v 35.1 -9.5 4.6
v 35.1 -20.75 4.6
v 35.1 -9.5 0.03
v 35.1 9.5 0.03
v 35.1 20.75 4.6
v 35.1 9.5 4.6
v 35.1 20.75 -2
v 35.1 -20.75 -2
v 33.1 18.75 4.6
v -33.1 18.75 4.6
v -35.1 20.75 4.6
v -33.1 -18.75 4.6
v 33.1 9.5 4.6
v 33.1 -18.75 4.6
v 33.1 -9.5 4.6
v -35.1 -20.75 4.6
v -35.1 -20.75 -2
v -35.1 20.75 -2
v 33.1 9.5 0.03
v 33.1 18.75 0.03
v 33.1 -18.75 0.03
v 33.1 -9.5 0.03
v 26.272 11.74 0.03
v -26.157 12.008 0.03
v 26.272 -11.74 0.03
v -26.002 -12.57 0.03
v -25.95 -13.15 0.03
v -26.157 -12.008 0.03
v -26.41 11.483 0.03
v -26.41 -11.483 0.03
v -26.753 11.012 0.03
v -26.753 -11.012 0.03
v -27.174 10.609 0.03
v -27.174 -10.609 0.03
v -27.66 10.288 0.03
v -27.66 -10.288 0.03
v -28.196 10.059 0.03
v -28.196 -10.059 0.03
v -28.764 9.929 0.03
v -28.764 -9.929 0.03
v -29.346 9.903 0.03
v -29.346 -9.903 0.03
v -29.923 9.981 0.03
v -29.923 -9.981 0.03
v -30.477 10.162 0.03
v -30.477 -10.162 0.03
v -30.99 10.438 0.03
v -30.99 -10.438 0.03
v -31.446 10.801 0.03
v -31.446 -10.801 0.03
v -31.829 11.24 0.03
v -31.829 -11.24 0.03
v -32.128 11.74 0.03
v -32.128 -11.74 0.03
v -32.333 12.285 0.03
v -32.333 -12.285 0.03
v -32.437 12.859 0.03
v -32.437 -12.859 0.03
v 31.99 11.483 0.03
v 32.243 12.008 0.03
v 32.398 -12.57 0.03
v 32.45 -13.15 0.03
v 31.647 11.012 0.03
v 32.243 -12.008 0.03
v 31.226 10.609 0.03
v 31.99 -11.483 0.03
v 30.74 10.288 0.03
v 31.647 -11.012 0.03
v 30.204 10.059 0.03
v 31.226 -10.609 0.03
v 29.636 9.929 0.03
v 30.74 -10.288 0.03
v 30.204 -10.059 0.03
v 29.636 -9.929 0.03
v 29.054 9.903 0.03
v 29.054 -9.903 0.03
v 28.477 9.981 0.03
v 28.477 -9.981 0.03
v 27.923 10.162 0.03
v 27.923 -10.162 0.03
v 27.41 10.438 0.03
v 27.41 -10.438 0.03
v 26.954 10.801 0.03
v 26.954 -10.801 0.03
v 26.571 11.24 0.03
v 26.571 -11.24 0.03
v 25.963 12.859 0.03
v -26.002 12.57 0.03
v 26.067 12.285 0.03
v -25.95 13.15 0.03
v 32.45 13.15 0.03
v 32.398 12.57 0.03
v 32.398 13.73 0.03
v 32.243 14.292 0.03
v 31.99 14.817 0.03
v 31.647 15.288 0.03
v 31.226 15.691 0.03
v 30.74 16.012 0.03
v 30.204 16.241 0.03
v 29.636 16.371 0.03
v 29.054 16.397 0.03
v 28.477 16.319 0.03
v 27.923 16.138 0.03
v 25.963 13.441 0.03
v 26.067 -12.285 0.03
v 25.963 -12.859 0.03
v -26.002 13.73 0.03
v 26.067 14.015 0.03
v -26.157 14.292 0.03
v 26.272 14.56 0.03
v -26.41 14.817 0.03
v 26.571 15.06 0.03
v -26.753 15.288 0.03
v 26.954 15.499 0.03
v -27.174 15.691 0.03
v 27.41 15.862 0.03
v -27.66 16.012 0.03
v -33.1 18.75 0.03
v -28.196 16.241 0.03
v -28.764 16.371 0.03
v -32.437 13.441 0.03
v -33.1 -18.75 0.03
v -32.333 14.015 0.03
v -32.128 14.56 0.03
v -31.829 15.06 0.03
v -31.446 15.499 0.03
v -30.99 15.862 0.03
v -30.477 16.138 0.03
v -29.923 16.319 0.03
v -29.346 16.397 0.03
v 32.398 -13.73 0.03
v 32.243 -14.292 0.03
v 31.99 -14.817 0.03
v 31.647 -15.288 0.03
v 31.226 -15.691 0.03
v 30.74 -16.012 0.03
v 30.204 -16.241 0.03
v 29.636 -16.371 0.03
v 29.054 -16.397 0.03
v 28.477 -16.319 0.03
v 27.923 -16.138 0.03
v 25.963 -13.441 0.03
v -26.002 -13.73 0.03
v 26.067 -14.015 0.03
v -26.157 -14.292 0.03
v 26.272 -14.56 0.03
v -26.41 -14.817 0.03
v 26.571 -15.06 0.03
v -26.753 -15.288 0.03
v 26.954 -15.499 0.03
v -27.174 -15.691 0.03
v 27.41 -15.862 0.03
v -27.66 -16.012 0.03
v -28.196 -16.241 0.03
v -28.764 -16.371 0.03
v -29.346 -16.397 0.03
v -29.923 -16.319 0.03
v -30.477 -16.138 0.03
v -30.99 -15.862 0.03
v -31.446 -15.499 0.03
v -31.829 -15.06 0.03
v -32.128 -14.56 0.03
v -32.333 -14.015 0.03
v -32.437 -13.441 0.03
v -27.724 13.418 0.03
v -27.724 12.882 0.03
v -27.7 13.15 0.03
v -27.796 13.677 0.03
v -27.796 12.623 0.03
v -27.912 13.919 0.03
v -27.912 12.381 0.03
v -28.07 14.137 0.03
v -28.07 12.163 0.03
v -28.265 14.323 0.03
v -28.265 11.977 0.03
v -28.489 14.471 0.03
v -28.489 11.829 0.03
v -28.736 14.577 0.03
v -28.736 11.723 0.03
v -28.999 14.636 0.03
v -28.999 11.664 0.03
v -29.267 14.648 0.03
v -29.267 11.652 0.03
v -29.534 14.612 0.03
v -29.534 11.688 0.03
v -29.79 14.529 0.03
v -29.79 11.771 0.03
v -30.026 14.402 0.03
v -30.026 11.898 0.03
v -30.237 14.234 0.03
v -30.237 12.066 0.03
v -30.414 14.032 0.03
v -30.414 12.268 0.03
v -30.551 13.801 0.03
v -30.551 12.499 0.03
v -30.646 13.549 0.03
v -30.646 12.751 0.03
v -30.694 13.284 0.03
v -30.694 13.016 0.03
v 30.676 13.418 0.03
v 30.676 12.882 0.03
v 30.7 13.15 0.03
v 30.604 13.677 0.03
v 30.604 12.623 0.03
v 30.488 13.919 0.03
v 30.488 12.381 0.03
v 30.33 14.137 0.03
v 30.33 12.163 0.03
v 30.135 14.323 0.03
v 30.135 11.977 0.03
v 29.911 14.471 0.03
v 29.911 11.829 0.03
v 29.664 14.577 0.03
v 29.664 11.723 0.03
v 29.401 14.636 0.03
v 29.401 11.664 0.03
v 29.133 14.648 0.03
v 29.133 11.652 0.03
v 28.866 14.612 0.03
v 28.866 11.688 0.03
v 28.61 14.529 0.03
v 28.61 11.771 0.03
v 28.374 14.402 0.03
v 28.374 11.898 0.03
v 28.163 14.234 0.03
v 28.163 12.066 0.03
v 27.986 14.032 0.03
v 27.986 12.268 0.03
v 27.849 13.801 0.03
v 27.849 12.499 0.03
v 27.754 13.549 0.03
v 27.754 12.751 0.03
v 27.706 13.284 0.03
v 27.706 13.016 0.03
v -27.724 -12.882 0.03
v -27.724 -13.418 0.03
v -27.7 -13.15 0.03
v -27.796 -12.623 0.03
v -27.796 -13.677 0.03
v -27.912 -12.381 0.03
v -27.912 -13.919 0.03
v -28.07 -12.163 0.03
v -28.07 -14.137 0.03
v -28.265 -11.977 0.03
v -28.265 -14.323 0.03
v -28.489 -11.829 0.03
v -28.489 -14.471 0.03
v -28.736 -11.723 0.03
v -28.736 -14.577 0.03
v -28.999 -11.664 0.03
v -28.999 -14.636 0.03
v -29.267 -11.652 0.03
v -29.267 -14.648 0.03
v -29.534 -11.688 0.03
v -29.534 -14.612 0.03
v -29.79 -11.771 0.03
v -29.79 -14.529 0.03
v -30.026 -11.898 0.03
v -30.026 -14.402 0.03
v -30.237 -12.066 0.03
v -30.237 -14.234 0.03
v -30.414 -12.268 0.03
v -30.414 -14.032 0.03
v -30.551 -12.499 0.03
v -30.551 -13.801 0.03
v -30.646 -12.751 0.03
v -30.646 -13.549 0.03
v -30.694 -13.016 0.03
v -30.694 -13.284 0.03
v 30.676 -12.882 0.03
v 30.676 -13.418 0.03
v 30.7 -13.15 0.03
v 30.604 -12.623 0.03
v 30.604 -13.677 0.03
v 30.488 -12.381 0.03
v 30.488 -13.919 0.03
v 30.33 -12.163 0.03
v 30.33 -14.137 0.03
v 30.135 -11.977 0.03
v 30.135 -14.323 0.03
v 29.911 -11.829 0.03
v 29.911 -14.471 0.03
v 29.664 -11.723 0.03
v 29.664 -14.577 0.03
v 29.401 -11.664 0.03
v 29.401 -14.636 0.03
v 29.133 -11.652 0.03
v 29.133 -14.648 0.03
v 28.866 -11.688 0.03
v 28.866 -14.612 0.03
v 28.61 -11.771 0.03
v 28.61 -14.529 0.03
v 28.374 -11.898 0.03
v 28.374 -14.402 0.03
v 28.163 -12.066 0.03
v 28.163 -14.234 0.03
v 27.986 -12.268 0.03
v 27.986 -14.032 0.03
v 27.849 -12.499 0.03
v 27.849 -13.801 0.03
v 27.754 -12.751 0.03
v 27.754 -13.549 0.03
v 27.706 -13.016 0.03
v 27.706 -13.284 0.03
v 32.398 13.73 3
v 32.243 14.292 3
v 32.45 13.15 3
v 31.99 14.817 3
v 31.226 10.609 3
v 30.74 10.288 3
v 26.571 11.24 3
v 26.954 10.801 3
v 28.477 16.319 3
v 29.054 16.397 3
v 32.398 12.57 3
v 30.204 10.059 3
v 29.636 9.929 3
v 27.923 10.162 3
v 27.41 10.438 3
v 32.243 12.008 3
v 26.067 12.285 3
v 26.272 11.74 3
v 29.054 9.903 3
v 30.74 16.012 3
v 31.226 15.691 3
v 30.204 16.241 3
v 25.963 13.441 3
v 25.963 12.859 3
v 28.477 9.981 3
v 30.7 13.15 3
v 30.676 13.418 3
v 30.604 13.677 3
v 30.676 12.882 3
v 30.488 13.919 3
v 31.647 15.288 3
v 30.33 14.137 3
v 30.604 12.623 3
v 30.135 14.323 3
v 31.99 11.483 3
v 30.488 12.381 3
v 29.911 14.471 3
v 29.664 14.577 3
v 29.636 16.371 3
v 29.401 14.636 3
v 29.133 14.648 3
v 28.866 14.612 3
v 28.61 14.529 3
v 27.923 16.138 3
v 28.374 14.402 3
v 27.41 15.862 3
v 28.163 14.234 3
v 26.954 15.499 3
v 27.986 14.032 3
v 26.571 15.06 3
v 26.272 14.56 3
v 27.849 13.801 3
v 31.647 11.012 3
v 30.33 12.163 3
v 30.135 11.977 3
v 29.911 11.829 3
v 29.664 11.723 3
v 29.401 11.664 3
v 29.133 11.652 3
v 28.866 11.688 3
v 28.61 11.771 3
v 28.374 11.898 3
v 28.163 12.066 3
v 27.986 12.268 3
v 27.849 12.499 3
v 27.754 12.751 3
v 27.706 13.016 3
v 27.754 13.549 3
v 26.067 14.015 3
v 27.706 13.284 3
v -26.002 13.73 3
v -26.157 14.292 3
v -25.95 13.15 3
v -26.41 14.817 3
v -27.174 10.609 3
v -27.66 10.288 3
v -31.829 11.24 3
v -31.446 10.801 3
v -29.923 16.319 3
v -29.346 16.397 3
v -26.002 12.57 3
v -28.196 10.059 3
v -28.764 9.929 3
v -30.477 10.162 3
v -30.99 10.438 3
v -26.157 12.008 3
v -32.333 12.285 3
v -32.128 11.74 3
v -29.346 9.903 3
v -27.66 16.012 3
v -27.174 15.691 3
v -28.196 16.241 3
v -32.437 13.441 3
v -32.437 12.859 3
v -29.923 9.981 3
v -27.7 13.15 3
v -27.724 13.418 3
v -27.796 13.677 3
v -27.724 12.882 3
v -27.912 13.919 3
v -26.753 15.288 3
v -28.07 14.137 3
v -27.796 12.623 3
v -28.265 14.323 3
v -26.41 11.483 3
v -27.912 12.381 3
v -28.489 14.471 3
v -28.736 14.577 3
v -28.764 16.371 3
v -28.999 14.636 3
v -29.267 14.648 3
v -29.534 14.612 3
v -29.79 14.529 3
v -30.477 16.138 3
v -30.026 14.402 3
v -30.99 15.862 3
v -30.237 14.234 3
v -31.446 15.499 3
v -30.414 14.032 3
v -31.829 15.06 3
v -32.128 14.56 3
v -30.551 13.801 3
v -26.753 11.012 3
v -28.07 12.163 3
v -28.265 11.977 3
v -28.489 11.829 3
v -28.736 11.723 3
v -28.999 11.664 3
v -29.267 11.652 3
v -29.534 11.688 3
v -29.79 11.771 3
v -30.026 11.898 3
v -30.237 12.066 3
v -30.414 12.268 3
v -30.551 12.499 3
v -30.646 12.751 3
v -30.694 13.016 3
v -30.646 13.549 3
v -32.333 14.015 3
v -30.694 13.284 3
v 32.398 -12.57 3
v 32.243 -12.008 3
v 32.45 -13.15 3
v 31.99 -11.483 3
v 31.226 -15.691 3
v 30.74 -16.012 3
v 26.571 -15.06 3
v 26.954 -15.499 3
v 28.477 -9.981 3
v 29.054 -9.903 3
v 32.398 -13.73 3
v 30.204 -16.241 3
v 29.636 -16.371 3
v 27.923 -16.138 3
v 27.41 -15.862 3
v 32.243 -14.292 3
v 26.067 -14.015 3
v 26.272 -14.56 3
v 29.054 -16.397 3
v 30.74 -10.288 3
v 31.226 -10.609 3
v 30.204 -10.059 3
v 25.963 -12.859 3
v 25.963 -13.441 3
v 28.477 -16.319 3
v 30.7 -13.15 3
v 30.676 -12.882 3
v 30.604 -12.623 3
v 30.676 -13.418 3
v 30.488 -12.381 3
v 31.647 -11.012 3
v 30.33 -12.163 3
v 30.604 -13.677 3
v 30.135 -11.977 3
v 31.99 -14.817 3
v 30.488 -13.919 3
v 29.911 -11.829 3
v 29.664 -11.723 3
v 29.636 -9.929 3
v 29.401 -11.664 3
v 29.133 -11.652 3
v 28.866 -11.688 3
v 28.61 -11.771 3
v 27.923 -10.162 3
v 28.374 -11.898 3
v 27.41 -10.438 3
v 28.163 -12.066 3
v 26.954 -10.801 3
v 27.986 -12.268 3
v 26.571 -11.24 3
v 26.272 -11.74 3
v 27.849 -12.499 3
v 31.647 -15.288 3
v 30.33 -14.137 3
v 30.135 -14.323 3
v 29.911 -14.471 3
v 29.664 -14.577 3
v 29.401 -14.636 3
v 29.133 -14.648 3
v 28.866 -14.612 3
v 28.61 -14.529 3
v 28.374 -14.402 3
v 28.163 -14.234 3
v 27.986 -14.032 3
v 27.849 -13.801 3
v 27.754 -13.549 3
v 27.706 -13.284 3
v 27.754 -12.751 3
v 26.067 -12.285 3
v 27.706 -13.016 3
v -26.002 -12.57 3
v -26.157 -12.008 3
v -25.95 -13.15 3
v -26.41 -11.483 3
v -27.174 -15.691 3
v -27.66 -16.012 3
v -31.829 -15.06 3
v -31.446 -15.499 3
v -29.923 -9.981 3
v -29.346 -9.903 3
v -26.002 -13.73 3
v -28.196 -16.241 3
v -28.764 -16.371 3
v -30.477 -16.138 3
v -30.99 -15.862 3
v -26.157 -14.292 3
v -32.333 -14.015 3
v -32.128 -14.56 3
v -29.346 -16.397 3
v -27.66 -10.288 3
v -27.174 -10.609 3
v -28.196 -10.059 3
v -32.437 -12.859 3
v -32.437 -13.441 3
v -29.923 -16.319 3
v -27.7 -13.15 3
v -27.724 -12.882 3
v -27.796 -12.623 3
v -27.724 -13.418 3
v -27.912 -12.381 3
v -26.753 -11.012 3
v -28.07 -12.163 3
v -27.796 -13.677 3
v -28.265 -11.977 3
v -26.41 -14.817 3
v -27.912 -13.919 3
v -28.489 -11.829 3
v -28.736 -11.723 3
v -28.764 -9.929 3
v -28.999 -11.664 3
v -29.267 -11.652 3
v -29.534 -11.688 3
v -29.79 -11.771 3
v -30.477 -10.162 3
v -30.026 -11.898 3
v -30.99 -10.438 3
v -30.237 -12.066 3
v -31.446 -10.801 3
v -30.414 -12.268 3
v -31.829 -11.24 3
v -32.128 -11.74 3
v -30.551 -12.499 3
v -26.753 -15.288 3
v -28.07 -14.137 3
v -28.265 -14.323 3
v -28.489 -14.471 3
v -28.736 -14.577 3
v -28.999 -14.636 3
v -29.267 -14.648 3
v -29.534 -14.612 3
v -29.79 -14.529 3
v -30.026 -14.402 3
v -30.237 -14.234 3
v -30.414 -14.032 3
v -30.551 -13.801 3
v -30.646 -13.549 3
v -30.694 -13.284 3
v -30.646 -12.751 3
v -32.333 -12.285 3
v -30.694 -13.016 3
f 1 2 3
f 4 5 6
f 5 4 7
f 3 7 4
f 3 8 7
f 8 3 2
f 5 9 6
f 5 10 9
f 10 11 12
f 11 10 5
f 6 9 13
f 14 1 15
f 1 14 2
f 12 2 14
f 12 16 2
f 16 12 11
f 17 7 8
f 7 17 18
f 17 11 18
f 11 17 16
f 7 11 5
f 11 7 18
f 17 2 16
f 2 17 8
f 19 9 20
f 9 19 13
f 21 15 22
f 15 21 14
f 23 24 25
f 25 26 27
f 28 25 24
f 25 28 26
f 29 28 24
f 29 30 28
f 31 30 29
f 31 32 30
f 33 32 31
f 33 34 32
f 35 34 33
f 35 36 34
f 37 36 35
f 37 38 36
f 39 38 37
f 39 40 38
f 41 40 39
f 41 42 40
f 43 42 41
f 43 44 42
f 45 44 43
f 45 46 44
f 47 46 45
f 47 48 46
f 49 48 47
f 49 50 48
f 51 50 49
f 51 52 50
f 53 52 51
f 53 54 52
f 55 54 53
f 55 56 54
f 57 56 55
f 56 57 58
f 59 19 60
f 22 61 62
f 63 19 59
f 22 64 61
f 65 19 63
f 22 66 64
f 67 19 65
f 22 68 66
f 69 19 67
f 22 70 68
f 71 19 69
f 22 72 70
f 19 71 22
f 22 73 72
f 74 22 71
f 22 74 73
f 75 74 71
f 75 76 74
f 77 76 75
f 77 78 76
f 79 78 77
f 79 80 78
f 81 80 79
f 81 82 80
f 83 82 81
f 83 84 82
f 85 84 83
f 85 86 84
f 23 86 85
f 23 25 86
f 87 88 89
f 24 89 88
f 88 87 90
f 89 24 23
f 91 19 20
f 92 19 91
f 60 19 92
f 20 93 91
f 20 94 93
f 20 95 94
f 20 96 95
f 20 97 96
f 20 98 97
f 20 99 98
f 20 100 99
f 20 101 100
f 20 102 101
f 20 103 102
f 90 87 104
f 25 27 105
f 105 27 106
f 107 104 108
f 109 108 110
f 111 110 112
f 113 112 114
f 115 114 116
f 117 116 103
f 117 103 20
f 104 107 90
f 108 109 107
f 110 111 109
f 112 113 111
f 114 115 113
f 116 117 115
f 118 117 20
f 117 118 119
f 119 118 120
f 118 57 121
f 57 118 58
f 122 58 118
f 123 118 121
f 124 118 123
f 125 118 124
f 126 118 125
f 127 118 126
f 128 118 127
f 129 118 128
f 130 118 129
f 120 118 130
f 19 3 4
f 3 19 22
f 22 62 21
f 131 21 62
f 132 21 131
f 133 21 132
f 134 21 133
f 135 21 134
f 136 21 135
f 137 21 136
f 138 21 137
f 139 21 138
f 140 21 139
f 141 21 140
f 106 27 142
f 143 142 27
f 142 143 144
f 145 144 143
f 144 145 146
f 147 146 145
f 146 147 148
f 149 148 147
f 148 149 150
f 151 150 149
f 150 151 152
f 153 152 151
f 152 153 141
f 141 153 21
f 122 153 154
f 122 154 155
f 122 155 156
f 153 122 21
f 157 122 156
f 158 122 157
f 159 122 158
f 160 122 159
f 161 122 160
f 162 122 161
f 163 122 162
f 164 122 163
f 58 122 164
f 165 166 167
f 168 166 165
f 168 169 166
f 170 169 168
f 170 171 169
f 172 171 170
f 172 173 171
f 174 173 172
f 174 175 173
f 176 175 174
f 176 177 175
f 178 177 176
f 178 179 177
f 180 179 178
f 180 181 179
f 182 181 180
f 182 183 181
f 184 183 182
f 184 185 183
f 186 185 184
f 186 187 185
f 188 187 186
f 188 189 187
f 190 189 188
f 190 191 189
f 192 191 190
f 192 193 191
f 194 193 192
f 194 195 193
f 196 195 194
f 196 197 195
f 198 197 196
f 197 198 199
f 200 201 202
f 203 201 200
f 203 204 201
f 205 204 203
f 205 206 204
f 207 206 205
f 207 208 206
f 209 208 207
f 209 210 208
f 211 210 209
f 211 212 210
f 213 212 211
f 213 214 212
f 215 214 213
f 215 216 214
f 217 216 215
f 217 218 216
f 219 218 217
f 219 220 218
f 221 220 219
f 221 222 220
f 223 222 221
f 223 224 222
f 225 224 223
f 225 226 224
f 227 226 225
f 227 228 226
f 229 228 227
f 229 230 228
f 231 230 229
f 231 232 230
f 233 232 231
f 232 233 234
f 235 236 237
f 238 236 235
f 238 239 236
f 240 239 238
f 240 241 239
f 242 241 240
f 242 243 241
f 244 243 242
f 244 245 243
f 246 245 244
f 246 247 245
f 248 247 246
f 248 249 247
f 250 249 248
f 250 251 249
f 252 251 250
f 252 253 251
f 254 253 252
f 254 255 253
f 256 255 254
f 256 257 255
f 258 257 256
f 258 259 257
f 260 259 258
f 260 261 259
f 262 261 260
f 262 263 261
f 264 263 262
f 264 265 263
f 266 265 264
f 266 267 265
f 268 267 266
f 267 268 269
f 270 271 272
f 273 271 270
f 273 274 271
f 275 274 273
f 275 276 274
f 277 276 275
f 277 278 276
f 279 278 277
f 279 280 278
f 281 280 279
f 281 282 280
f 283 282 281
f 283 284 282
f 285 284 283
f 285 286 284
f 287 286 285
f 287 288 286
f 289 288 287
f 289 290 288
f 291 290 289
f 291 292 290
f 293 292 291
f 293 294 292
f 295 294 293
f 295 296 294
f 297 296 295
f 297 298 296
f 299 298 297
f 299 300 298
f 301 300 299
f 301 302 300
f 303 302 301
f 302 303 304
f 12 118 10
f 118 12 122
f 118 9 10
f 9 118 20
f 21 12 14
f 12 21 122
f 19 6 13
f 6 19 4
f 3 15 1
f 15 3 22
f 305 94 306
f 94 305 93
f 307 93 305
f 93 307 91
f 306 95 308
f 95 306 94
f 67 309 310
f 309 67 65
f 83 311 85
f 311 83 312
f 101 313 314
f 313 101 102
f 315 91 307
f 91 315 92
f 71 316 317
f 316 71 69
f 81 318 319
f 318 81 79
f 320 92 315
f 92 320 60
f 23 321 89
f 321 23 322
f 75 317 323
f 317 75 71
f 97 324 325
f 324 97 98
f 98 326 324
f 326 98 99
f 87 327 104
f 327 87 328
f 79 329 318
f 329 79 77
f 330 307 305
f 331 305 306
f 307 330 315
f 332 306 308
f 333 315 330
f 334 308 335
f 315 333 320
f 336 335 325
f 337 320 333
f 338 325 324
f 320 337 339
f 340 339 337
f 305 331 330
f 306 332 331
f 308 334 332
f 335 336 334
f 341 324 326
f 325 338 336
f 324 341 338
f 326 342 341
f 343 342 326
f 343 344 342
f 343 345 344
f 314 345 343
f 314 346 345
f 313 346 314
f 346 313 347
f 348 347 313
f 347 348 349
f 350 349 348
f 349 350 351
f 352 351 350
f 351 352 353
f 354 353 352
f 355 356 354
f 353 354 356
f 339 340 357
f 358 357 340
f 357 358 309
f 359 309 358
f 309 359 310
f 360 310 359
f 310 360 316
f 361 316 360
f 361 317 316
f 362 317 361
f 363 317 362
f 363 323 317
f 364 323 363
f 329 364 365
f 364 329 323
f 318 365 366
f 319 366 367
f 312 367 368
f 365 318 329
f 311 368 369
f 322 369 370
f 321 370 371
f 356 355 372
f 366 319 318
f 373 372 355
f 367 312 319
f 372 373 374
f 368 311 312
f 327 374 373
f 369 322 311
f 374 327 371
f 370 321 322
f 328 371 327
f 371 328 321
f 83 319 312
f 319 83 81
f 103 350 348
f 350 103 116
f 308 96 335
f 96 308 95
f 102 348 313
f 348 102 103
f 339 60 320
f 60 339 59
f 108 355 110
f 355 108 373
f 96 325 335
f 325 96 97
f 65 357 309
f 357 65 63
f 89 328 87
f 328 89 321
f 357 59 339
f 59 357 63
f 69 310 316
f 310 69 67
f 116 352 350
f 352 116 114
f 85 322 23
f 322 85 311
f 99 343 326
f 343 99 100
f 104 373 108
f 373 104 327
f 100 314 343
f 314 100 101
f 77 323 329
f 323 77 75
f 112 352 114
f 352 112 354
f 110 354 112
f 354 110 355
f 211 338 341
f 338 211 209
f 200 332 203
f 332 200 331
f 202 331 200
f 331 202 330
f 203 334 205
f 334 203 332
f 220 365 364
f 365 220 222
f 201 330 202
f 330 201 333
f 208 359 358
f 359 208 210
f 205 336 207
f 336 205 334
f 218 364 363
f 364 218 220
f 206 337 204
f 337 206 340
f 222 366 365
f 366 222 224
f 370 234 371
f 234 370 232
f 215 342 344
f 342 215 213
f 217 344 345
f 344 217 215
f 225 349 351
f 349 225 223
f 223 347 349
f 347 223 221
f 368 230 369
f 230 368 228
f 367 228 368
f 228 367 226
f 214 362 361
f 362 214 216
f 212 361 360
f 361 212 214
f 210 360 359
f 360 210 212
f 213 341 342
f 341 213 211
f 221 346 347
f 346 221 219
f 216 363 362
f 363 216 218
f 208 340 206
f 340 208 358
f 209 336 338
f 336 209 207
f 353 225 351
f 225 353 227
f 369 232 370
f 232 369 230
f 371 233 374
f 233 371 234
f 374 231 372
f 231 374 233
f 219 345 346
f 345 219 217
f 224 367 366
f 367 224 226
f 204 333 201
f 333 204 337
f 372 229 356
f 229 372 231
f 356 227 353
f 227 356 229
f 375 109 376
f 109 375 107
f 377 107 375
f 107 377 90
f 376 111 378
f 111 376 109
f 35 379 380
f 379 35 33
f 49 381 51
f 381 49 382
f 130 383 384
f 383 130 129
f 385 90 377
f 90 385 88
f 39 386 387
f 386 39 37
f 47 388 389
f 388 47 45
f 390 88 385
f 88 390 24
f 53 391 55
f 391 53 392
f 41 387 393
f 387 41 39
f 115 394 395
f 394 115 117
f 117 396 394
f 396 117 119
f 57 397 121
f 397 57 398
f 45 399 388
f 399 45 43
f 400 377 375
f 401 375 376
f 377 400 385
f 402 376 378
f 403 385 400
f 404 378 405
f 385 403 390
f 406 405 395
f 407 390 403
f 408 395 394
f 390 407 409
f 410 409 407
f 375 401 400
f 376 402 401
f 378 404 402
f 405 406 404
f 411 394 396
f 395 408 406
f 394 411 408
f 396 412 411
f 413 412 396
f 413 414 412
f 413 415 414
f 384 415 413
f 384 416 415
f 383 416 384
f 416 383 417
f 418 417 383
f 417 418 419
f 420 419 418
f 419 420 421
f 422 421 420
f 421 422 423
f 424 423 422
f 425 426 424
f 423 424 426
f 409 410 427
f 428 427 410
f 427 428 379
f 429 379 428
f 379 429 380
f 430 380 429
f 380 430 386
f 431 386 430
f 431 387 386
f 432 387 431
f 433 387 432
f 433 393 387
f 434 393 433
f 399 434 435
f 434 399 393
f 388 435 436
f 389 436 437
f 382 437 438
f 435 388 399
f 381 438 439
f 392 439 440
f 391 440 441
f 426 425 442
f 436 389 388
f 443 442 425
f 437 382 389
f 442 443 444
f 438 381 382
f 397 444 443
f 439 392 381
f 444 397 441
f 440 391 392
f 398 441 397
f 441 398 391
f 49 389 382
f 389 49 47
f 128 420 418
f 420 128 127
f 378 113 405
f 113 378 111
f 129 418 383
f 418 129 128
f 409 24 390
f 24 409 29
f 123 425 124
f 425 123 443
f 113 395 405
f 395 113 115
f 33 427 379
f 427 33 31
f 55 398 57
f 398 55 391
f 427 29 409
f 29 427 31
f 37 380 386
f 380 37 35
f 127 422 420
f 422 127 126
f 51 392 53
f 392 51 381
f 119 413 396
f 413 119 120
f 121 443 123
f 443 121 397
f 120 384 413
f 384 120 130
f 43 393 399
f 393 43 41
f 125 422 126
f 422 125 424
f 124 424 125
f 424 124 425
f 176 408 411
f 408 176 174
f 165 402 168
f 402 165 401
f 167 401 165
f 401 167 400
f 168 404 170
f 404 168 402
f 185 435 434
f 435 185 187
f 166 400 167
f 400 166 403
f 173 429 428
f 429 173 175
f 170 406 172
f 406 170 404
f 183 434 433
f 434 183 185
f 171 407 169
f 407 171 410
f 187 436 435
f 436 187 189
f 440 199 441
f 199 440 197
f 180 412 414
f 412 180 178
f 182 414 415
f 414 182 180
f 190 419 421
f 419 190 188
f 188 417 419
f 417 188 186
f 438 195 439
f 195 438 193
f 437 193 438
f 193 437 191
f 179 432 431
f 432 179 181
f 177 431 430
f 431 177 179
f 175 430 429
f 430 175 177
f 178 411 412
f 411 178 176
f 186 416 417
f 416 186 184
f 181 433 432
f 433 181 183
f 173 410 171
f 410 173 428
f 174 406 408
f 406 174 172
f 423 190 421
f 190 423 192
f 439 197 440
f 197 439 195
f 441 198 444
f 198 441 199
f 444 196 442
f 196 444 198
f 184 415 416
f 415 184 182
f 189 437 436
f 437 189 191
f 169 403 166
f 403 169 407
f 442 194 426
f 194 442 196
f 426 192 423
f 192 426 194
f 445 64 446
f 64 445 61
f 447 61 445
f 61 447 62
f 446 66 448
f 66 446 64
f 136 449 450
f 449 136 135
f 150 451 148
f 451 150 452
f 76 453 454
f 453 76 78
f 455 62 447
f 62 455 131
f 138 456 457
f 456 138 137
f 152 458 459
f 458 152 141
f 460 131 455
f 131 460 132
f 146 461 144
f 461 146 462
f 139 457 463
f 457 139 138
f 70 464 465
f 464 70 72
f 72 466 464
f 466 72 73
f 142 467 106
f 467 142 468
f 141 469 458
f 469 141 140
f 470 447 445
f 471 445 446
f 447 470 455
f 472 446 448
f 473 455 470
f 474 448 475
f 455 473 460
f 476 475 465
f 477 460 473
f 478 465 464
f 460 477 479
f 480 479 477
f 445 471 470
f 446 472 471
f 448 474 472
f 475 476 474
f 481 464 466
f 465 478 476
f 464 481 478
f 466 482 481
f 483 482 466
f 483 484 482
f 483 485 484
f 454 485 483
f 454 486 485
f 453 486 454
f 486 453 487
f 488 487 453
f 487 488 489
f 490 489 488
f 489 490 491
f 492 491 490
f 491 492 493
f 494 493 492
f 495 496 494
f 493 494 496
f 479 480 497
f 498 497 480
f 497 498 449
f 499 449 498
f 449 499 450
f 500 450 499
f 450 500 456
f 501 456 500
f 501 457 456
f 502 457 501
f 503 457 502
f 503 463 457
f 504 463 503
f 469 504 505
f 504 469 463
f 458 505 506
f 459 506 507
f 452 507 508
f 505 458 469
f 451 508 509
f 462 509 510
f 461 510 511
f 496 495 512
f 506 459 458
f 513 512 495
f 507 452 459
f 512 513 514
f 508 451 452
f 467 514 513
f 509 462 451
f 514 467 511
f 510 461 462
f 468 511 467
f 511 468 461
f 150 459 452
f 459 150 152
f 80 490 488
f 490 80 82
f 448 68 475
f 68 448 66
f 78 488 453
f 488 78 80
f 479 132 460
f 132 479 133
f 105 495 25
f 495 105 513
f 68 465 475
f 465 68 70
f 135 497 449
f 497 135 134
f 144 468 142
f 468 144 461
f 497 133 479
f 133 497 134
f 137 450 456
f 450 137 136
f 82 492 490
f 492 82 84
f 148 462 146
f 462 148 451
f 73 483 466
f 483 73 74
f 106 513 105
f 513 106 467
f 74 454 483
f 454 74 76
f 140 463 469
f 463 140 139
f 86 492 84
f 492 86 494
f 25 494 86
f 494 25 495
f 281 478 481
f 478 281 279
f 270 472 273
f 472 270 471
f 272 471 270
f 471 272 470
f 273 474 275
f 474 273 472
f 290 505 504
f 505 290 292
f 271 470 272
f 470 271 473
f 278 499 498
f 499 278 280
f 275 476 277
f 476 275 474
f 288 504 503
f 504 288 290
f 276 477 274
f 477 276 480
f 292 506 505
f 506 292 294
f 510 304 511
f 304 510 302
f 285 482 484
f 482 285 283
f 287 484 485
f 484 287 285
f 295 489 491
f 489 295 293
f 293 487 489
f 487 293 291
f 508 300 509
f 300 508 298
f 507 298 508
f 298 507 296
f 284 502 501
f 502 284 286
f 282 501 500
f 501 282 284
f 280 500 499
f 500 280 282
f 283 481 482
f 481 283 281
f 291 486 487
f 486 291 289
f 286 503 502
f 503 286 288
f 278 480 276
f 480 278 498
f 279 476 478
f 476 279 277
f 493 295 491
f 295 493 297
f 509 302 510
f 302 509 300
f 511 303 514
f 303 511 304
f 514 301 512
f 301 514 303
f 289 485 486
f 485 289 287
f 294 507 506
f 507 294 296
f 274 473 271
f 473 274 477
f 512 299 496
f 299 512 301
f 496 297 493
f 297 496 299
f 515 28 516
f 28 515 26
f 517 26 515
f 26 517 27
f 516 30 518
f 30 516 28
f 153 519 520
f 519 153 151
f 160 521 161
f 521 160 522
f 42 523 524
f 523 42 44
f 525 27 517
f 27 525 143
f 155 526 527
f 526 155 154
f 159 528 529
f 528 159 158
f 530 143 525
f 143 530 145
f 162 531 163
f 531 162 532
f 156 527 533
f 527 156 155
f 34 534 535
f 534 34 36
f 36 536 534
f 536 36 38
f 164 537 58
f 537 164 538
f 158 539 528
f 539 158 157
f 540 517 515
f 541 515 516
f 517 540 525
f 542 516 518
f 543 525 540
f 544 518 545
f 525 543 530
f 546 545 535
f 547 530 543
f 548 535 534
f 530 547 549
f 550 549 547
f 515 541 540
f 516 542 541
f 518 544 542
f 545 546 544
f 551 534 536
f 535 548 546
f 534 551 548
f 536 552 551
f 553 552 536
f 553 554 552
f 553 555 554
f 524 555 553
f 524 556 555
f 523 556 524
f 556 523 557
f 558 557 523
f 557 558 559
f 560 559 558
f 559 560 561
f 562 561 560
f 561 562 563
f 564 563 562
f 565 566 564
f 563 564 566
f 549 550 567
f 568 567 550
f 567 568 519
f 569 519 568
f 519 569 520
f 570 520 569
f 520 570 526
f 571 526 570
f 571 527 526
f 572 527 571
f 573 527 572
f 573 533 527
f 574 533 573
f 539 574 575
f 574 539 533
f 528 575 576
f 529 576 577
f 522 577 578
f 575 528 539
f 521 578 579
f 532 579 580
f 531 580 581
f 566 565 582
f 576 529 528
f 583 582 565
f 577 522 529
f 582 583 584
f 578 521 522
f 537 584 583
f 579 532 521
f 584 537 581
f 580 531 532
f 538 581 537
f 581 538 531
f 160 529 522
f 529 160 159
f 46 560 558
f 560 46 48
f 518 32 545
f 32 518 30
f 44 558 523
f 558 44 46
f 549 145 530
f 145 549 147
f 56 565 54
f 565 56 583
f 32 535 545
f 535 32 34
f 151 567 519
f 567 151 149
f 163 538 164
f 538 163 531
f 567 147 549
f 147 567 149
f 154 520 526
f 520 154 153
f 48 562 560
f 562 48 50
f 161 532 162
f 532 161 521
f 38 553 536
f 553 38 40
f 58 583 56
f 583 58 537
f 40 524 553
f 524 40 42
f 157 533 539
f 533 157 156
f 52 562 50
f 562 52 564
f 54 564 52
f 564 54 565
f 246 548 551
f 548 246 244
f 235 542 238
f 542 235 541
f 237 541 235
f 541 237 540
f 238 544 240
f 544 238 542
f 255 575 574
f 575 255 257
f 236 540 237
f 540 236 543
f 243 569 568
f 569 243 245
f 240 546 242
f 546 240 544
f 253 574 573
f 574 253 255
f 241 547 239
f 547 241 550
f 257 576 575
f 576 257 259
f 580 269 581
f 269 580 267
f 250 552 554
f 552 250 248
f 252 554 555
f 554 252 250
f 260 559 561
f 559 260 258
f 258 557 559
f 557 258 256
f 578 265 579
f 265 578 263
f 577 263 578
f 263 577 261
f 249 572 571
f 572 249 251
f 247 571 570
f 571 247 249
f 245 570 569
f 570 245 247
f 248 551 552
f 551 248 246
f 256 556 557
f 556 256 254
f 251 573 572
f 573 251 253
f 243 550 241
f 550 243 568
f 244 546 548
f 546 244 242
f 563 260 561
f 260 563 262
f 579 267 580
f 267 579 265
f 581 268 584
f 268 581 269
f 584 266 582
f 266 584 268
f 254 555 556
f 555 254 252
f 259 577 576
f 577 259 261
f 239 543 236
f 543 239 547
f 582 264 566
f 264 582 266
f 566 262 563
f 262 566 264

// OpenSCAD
// DC-DC boost converter (eg. 12V -> 24V) based on UC3843A (100 kHz)
// www.ebay.com/itm/271416568548
// Oct. 29, 2014  J. Beale
// version 1.0

// ==============================================================
slop = 0.2;  // size by which ID of holes shrinks during print
fn = 50;     // facets on a cylinder
eps = 0.03;  // a small number

BRDX = 65.4;  // PCB length
BRDY = 36.7;  // PCB width
BRDZ = 1.6;    // PCB thickness
MHID = 3.05;  // mounting hole ID
MHXOFF = 3.5;  // mounting hole X offset from edge
MHYOFF = 5.2;  // mounting hole Y offset from edge 
BKOX = 47.8; // bottom keepout X
BKOY = 18;   // bottom keepout Y
BKOZ = 3.0;  // bottom keepout Z
HSX = 45.9; // heatsink length
HSY = 10.1; // heatsink width
HSZ = 20.3; // heatsink height
HSSX = 3.9; // heatsink slot width
HSSY = HSY-2.6; // heatsink slot depth
HSSsp = 35/7; // heatsink slot spacing
HSSXoff = 1.0; // heatsink slot offset
HSYoff = 14; // heatsink offset from center, Y axis
TROD = 27; // toroid OD
TRZ = 13.2; // toroid Z height (incl. wire windings)
TRXoff = 12.8; // center offset of toroid
CAPOD = 13.2; // filter cap OD
CAPZ = 21.6; // filter cap Z height
CAPXoff = 13; // filter cap X offset
CAPYoff = 6.8; // filter cap Y offset
TBX = 7.6;  // terminal block X
TBY = 20;   // terminal block Y
TBZ = 11.1; // terminal block Z
TBXoff = 1.4; // terminal block offset from edge
TRIMX = 5.1; // trimmer X
TRIMY = 9.52; // trimmer Y
TRIMZ = 11.7-1.6; // trimmer Z
TRIMXoff = BRDX/2 - 1.2; // trimmer X offset from center
TRSOD = 2.25; // trimmer screw OD
TRSZ = 1.5; // trimmer screw Z

// TO-220 heatsink
module Heatsink() {
  difference() {
    cube([HSX,HSY,HSZ]);
    for ( i = [0 : 9]) {
      translate([HSSXoff+(i*HSSsp),-eps,-eps]) cube([HSSX,HSSY,HSZ+eps*2]);
    }
  }
}

module DCBoost() {
 difference() {
  union() {
      // main PCB
    translate([0,0,BRDZ/2]) cube([BRDX,BRDY,BRDZ], center=true);
      // trimmer (output voltage adjust)
    translate([-TRIMXoff,0,BRDZ]) union() {
        color("blue") cube([TRIMX,TRIMY,TRIMZ]);
        color("yellow") translate([TRSOD/2,TRSOD/2,TRIMZ]) cylinder(d=TRSOD,h=TRSZ,$fn=16);
    }
      // TO-220 heatsinks
    color("grey") rotate([0,0,180]) translate([-HSX/2,-HSYoff-HSY,BRDZ]) Heatsink() ;
    color("grey") translate([-HSX/2,-HSYoff-HSY,BRDZ])  Heatsink() ;
      // terminal block
    color("green") translate([(BRDX-TBX)/2-TBXoff,0,BRDZ+TBZ/2]) 
        cube([TBX,TBY,TBZ],center=true);
      // toroidal inductor
    color([.3,.2,.2]) translate([-TRXoff,0,BRDZ]) cylinder(d=TROD, h=TRZ, $fn=30);
      // 2 filter caps
    color([.3,.3,.3]) translate([CAPXoff,CAPYoff,BRDZ]) cylinder(d=CAPOD, h=CAPZ, $fn=30);
    color([.3,.3,.3]) translate([CAPXoff,-CAPYoff,BRDZ]) cylinder(d=CAPOD, h=CAPZ, $fn=30);

      // bottom keep-out zone for components & added wires
    color([0.4,0.4,0.6]) translate([0,0,-BKOZ/2])  cube([BRDX,BKOY,BKOZ], center=true);
    color([0.4,0.4,0.6]) translate([0,0,-BKOZ/2])  cube([BKOX,BRDY,BKOZ], center=true);
  }
  // 4x mounting holes at corners
  translate([(BRDX/2-MHXOFF),(BRDY/2-MHYOFF),-BRDZ])
      cylinder(d=MHID,h=BRDZ*10,$fn=fn);
  translate([-(BRDX/2-MHXOFF),(BRDY/2-MHYOFF),-BRDZ])
      cylinder(d=MHID,h=BRDZ*10,$fn=fn);
  translate([(BRDX/2-MHXOFF),-(BRDY/2-MHYOFF),-BRDZ])
      cylinder(d=MHID,h=BRDZ*10,$fn=fn);
  translate([-(BRDX/2-MHXOFF),-(BRDY/2-MHYOFF),-BRDZ])
      cylinder(d=MHID,h=BRDZ*10,$fn=fn);    
    }
}

// =========================================
CBTH = 2;  // case thickness
CBCL = 0.4; // clearance to PCB
CBX = BRDX + (CBTH+CBCL)*2;  // case bottom X size
CBY = BRDY + (CBTH+CBCL)*2; // case bottom Y size
CBZ = BRDZ + BKOZ + CBTH; // case bottom Z size
SBOD = 6.5; // mounting screw boss OD
SBID = 3; // mounting screw boss ID
SBZ = 4; // mounting screw boss height
CBNY = 19; // width of notch in case bottom (for wires)
TRMZ = 11.6+5; // height of top of trimmer pot adj above board, plus clearance
MSHD = 5.35 + slop; // diameter of head of M3 mounting screw

// =====  TOP PART of case ========

// ---------------------------------------------------------------------------
CTZ = CAPZ + CBTH + CBCL;  // height of case top (caps are tallest item)
HSCL = 0.3; // heatsink clearance

module CaseT1() { // outer shell of case top
  difference() {
    translate([0,0,CTZ/2]) cube([CBX,CBY,CTZ], center=true); // shell
    translate([0,0,(CAPZ+CBCL)/2-eps]) cube([BRDX+CBCL*2, BRDY+CBCL*2,CAPZ+CBCL], center=true); // hollow
    translate([-HSX/2-HSCL/2,-HSYoff-HSY,-HSCL]) cube([HSX+HSCL*2,HSY,HSZ+HSCL]); // notch for heatsink
    rotate([0,0,180]) translate([-HSX/2-HSCL/2,-HSYoff-HSY,-HSCL]) cube([HSX+HSCL,HSY,HSZ+HSCL*2]); // notch for heatsink
      
  }
} // end module CaseT1()

HSBY = 2.60;  // width of heatsink root 
HSBCO = 27.9/2; // heatsink edge center offset

module CaseT2() { // case top 
  difference() {
    union() {
        CaseT1();
        translate([-TRIMXoff+TRSOD/2,TRSOD/2,TRMZ]) 
          cylinder(d=TRSOD+2,h=CTZ-TRMZ,$fn=16); // shaft surrounding hole for V_adjust

        // walls for screw terminal nook
        translate([(BRDX/2)-TBXoff+eps,0,BRDZ+TBZ-.7]) 
          cube([TBX*2+2,TBY+2,CTZ],center=true);
        
        // form wall to meet top of heatsink
        translate([-(HSX+2*CBTH)/2,HSBCO,HSZ+0.2]) cube([HSX+CBTH*2,HSBY+4,3]); 
        rotate([0,0,180]) translate([-(HSX+2*CBTH)/2,HSBCO,HSZ+0.2]) cube([HSX+CBTH*2,HSBY+4,3]); 

        // screw boss pillar
        translate([(BRDX/2-MHXOFF),(BRDY/2-MHYOFF),(CTZ-1)/2]) SBoss(CTZ-1);
        translate([-(BRDX/2-MHXOFF),(BRDY/2-MHYOFF),(CTZ-1)/2]) SBoss(CTZ-1);
        translate([(BRDX/2-MHXOFF),-(BRDY/2-MHYOFF),(CTZ-1)/2]) SBoss(CTZ-1);
        translate([-(BRDX/2-MHXOFF),-(BRDY/2-MHYOFF),(CTZ-1)/2]) SBoss(CTZ-1);
        
        translate([(BRDX/2-MHXOFF),(BRDY/2-MHYOFF),(CTZ-1)/2]) rotate([0,0,180]) SBS(CTZ-1);
        translate([-(BRDX/2-MHXOFF),(BRDY/2-MHYOFF),(CTZ-1)/2]) SBS(CTZ-1);
        translate([(BRDX/2-MHXOFF),-(BRDY/2-MHYOFF),(CTZ-1)/2]) rotate([0,0,180]) SBS(CTZ-1);
        translate([-(BRDX/2-MHXOFF),-(BRDY/2-MHYOFF),(CTZ-1)/2]) SBS(CTZ-1);

        
        } // end union
        
      // notch for screw terminal block
    translate([(BRDX/2)-TBXoff+eps,0,BRDZ+TBZ/2]) 
        cube([TBX*2,TBY,CTZ*2],center=true);
    translate([CBX/2+eps,-50,-eps]) cube([100,100,100]);
    translate([-TRIMXoff+TRSOD/2,TRSOD/2,TRIMZ]) 
            cylinder(d=TRSOD,h=CTZ*2,$fn=16); // hole for V_adjust
    translate([(BRDX-TBX)/2-TBXoff-5,0,(TBZ-2)/2-eps]) // notch for term.block
        cube([TBX,TBY,TBZ-2],center=true);
        // make notch to expose top of heatsink fins
    translate([-HSX/2,HSBCO+HSBY,HSZ-0.2]) cube([HSX,HSBY*4,50]); 
    rotate([0,0,180]) translate([-HSX/2,HSBCO+HSBY,HSZ-0.2]) cube([HSX,HSBY*4,50]); 
         // 4x through-holes for corner mounting screws
    translate([(BRDX/2-MHXOFF),(BRDY/2-MHYOFF),CTZ/2]) MHole(SBID,CTZ+eps);
    translate([-(BRDX/2-MHXOFF),(BRDY/2-MHYOFF),CTZ/2]) MHole(SBID,CTZ+eps);
    translate([(BRDX/2-MHXOFF),-(BRDY/2-MHYOFF),CTZ/2]) MHole(SBID,CTZ+eps);
    translate([-(BRDX/2-MHXOFF),-(BRDY/2-MHYOFF),CTZ/2]) MHole(SBID,CTZ+eps);
        // countersink for screw heads
    translate([(BRDX/2-MHXOFF),(BRDY/2-MHYOFF),20.1]) MHole(MSHD,20);
    translate([-(BRDX/2-MHXOFF),(BRDY/2-MHYOFF),20.1]) MHole(MSHD,20);
    translate([(BRDX/2-MHXOFF),-(BRDY/2-MHYOFF),20.1]) MHole(MSHD,20);
    translate([-(BRDX/2-MHXOFF),-(BRDY/2-MHYOFF),20.1]) MHole(MSHD,20);
        
    // translate([BRDX/2-MHXOFF,(BRDY/2-MHYOFF),0]) cube([100,100,100]); // DEBUG cutaway

  }
}  // end module CaseT2()


// =====  BOTTOM PART of case ======================================

module CaseB1() { // outer shell of case bottom
  difference() {
    translate([0,0,-CBZ/2]) cube([CBX,CBY,CBZ], center = true); // shell
    translate([0,0,-(BRDZ+BKOZ)/2 + eps ]) 
      cube([BRDX+CBCL*2,BRDY+CBCL*2,BRDZ+BKOZ], center = true); // hollow
    translate([0,0,-(BRDZ+BKOZ)/2 + eps ])
      translate([CBX/2,0,0]) cube([CBX,CBNY,BRDZ+BKOZ], center=true); // notch
    // translate([0,0,-50]) cube([100,100,100]);  // DEBUG cutaway
  }
}

module MHole(diam,len) { // hole for mounting screw
   cylinder(d=diam,h=len,$fn=35);
}

module SBoss(height) {  // mounting screw boss
    difference() {
       cylinder(d=SBOD,h=height,$fn=35,center=true);
       cylinder(d=SBID,h=height+eps,$fn=35,center=true);
     }
}

module SBS(height) {  // Screw Boss post support flange
BW = 3;
    translate([-5,-1,-height/2]) cube([BW,2,height],center=false);
}

module M3() { // mounting screw, M3 x 24.5 mm
FullZ = 26.8; // full length including head
HeadZ = 2.3;  // height of head
  cylinder(d=2.94, h=FullZ, $fn=10); // OD of thread, length incl. head
  translate([0,0,FullZ-HeadZ]) cylinder(d=5.3, h=HeadZ, $fn=14); // screw head 
}

module CaseB2() {
  difference() {
   union() {
     CaseB1();
     translate([(BRDX/2-MHXOFF),(BRDY/2-MHYOFF),-SBZ/2-BRDZ]) SBoss(SBZ);
     translate([-(BRDX/2-MHXOFF),(BRDY/2-MHYOFF),-SBZ/2-BRDZ]) SBoss(SBZ);
     translate([(BRDX/2-MHXOFF),-(BRDY/2-MHYOFF),-SBZ/2-BRDZ]) SBoss(SBZ);
     translate([-(BRDX/2-MHXOFF),-(BRDY/2-MHYOFF),-SBZ/2-BRDZ]) SBoss(SBZ);
   }
   // translate([BRDX/2-MHXOFF,(BRDY/2-MHYOFF),-50]) cube([100,100,100]); // DEBUG cutaway
   
 }
}

//translate([0,0,BKOZ]) DCBoost();  // DC-Boost circuit PCB + electronics
color("brown") translate([0,0,4.6]) CaseB2();  // bottom part of case
// translate([0,0,BRDZ+BKOZ]) CaseT2(); // top part of case
// rotate([0,180,0]) translate([0,0,-CTZ]) CaseT2(); // top part of case

// color("blue") translate([(BRDX/2-MHXOFF),(BRDY/2-MHYOFF),0.2]) M3();  // mnt.screw
